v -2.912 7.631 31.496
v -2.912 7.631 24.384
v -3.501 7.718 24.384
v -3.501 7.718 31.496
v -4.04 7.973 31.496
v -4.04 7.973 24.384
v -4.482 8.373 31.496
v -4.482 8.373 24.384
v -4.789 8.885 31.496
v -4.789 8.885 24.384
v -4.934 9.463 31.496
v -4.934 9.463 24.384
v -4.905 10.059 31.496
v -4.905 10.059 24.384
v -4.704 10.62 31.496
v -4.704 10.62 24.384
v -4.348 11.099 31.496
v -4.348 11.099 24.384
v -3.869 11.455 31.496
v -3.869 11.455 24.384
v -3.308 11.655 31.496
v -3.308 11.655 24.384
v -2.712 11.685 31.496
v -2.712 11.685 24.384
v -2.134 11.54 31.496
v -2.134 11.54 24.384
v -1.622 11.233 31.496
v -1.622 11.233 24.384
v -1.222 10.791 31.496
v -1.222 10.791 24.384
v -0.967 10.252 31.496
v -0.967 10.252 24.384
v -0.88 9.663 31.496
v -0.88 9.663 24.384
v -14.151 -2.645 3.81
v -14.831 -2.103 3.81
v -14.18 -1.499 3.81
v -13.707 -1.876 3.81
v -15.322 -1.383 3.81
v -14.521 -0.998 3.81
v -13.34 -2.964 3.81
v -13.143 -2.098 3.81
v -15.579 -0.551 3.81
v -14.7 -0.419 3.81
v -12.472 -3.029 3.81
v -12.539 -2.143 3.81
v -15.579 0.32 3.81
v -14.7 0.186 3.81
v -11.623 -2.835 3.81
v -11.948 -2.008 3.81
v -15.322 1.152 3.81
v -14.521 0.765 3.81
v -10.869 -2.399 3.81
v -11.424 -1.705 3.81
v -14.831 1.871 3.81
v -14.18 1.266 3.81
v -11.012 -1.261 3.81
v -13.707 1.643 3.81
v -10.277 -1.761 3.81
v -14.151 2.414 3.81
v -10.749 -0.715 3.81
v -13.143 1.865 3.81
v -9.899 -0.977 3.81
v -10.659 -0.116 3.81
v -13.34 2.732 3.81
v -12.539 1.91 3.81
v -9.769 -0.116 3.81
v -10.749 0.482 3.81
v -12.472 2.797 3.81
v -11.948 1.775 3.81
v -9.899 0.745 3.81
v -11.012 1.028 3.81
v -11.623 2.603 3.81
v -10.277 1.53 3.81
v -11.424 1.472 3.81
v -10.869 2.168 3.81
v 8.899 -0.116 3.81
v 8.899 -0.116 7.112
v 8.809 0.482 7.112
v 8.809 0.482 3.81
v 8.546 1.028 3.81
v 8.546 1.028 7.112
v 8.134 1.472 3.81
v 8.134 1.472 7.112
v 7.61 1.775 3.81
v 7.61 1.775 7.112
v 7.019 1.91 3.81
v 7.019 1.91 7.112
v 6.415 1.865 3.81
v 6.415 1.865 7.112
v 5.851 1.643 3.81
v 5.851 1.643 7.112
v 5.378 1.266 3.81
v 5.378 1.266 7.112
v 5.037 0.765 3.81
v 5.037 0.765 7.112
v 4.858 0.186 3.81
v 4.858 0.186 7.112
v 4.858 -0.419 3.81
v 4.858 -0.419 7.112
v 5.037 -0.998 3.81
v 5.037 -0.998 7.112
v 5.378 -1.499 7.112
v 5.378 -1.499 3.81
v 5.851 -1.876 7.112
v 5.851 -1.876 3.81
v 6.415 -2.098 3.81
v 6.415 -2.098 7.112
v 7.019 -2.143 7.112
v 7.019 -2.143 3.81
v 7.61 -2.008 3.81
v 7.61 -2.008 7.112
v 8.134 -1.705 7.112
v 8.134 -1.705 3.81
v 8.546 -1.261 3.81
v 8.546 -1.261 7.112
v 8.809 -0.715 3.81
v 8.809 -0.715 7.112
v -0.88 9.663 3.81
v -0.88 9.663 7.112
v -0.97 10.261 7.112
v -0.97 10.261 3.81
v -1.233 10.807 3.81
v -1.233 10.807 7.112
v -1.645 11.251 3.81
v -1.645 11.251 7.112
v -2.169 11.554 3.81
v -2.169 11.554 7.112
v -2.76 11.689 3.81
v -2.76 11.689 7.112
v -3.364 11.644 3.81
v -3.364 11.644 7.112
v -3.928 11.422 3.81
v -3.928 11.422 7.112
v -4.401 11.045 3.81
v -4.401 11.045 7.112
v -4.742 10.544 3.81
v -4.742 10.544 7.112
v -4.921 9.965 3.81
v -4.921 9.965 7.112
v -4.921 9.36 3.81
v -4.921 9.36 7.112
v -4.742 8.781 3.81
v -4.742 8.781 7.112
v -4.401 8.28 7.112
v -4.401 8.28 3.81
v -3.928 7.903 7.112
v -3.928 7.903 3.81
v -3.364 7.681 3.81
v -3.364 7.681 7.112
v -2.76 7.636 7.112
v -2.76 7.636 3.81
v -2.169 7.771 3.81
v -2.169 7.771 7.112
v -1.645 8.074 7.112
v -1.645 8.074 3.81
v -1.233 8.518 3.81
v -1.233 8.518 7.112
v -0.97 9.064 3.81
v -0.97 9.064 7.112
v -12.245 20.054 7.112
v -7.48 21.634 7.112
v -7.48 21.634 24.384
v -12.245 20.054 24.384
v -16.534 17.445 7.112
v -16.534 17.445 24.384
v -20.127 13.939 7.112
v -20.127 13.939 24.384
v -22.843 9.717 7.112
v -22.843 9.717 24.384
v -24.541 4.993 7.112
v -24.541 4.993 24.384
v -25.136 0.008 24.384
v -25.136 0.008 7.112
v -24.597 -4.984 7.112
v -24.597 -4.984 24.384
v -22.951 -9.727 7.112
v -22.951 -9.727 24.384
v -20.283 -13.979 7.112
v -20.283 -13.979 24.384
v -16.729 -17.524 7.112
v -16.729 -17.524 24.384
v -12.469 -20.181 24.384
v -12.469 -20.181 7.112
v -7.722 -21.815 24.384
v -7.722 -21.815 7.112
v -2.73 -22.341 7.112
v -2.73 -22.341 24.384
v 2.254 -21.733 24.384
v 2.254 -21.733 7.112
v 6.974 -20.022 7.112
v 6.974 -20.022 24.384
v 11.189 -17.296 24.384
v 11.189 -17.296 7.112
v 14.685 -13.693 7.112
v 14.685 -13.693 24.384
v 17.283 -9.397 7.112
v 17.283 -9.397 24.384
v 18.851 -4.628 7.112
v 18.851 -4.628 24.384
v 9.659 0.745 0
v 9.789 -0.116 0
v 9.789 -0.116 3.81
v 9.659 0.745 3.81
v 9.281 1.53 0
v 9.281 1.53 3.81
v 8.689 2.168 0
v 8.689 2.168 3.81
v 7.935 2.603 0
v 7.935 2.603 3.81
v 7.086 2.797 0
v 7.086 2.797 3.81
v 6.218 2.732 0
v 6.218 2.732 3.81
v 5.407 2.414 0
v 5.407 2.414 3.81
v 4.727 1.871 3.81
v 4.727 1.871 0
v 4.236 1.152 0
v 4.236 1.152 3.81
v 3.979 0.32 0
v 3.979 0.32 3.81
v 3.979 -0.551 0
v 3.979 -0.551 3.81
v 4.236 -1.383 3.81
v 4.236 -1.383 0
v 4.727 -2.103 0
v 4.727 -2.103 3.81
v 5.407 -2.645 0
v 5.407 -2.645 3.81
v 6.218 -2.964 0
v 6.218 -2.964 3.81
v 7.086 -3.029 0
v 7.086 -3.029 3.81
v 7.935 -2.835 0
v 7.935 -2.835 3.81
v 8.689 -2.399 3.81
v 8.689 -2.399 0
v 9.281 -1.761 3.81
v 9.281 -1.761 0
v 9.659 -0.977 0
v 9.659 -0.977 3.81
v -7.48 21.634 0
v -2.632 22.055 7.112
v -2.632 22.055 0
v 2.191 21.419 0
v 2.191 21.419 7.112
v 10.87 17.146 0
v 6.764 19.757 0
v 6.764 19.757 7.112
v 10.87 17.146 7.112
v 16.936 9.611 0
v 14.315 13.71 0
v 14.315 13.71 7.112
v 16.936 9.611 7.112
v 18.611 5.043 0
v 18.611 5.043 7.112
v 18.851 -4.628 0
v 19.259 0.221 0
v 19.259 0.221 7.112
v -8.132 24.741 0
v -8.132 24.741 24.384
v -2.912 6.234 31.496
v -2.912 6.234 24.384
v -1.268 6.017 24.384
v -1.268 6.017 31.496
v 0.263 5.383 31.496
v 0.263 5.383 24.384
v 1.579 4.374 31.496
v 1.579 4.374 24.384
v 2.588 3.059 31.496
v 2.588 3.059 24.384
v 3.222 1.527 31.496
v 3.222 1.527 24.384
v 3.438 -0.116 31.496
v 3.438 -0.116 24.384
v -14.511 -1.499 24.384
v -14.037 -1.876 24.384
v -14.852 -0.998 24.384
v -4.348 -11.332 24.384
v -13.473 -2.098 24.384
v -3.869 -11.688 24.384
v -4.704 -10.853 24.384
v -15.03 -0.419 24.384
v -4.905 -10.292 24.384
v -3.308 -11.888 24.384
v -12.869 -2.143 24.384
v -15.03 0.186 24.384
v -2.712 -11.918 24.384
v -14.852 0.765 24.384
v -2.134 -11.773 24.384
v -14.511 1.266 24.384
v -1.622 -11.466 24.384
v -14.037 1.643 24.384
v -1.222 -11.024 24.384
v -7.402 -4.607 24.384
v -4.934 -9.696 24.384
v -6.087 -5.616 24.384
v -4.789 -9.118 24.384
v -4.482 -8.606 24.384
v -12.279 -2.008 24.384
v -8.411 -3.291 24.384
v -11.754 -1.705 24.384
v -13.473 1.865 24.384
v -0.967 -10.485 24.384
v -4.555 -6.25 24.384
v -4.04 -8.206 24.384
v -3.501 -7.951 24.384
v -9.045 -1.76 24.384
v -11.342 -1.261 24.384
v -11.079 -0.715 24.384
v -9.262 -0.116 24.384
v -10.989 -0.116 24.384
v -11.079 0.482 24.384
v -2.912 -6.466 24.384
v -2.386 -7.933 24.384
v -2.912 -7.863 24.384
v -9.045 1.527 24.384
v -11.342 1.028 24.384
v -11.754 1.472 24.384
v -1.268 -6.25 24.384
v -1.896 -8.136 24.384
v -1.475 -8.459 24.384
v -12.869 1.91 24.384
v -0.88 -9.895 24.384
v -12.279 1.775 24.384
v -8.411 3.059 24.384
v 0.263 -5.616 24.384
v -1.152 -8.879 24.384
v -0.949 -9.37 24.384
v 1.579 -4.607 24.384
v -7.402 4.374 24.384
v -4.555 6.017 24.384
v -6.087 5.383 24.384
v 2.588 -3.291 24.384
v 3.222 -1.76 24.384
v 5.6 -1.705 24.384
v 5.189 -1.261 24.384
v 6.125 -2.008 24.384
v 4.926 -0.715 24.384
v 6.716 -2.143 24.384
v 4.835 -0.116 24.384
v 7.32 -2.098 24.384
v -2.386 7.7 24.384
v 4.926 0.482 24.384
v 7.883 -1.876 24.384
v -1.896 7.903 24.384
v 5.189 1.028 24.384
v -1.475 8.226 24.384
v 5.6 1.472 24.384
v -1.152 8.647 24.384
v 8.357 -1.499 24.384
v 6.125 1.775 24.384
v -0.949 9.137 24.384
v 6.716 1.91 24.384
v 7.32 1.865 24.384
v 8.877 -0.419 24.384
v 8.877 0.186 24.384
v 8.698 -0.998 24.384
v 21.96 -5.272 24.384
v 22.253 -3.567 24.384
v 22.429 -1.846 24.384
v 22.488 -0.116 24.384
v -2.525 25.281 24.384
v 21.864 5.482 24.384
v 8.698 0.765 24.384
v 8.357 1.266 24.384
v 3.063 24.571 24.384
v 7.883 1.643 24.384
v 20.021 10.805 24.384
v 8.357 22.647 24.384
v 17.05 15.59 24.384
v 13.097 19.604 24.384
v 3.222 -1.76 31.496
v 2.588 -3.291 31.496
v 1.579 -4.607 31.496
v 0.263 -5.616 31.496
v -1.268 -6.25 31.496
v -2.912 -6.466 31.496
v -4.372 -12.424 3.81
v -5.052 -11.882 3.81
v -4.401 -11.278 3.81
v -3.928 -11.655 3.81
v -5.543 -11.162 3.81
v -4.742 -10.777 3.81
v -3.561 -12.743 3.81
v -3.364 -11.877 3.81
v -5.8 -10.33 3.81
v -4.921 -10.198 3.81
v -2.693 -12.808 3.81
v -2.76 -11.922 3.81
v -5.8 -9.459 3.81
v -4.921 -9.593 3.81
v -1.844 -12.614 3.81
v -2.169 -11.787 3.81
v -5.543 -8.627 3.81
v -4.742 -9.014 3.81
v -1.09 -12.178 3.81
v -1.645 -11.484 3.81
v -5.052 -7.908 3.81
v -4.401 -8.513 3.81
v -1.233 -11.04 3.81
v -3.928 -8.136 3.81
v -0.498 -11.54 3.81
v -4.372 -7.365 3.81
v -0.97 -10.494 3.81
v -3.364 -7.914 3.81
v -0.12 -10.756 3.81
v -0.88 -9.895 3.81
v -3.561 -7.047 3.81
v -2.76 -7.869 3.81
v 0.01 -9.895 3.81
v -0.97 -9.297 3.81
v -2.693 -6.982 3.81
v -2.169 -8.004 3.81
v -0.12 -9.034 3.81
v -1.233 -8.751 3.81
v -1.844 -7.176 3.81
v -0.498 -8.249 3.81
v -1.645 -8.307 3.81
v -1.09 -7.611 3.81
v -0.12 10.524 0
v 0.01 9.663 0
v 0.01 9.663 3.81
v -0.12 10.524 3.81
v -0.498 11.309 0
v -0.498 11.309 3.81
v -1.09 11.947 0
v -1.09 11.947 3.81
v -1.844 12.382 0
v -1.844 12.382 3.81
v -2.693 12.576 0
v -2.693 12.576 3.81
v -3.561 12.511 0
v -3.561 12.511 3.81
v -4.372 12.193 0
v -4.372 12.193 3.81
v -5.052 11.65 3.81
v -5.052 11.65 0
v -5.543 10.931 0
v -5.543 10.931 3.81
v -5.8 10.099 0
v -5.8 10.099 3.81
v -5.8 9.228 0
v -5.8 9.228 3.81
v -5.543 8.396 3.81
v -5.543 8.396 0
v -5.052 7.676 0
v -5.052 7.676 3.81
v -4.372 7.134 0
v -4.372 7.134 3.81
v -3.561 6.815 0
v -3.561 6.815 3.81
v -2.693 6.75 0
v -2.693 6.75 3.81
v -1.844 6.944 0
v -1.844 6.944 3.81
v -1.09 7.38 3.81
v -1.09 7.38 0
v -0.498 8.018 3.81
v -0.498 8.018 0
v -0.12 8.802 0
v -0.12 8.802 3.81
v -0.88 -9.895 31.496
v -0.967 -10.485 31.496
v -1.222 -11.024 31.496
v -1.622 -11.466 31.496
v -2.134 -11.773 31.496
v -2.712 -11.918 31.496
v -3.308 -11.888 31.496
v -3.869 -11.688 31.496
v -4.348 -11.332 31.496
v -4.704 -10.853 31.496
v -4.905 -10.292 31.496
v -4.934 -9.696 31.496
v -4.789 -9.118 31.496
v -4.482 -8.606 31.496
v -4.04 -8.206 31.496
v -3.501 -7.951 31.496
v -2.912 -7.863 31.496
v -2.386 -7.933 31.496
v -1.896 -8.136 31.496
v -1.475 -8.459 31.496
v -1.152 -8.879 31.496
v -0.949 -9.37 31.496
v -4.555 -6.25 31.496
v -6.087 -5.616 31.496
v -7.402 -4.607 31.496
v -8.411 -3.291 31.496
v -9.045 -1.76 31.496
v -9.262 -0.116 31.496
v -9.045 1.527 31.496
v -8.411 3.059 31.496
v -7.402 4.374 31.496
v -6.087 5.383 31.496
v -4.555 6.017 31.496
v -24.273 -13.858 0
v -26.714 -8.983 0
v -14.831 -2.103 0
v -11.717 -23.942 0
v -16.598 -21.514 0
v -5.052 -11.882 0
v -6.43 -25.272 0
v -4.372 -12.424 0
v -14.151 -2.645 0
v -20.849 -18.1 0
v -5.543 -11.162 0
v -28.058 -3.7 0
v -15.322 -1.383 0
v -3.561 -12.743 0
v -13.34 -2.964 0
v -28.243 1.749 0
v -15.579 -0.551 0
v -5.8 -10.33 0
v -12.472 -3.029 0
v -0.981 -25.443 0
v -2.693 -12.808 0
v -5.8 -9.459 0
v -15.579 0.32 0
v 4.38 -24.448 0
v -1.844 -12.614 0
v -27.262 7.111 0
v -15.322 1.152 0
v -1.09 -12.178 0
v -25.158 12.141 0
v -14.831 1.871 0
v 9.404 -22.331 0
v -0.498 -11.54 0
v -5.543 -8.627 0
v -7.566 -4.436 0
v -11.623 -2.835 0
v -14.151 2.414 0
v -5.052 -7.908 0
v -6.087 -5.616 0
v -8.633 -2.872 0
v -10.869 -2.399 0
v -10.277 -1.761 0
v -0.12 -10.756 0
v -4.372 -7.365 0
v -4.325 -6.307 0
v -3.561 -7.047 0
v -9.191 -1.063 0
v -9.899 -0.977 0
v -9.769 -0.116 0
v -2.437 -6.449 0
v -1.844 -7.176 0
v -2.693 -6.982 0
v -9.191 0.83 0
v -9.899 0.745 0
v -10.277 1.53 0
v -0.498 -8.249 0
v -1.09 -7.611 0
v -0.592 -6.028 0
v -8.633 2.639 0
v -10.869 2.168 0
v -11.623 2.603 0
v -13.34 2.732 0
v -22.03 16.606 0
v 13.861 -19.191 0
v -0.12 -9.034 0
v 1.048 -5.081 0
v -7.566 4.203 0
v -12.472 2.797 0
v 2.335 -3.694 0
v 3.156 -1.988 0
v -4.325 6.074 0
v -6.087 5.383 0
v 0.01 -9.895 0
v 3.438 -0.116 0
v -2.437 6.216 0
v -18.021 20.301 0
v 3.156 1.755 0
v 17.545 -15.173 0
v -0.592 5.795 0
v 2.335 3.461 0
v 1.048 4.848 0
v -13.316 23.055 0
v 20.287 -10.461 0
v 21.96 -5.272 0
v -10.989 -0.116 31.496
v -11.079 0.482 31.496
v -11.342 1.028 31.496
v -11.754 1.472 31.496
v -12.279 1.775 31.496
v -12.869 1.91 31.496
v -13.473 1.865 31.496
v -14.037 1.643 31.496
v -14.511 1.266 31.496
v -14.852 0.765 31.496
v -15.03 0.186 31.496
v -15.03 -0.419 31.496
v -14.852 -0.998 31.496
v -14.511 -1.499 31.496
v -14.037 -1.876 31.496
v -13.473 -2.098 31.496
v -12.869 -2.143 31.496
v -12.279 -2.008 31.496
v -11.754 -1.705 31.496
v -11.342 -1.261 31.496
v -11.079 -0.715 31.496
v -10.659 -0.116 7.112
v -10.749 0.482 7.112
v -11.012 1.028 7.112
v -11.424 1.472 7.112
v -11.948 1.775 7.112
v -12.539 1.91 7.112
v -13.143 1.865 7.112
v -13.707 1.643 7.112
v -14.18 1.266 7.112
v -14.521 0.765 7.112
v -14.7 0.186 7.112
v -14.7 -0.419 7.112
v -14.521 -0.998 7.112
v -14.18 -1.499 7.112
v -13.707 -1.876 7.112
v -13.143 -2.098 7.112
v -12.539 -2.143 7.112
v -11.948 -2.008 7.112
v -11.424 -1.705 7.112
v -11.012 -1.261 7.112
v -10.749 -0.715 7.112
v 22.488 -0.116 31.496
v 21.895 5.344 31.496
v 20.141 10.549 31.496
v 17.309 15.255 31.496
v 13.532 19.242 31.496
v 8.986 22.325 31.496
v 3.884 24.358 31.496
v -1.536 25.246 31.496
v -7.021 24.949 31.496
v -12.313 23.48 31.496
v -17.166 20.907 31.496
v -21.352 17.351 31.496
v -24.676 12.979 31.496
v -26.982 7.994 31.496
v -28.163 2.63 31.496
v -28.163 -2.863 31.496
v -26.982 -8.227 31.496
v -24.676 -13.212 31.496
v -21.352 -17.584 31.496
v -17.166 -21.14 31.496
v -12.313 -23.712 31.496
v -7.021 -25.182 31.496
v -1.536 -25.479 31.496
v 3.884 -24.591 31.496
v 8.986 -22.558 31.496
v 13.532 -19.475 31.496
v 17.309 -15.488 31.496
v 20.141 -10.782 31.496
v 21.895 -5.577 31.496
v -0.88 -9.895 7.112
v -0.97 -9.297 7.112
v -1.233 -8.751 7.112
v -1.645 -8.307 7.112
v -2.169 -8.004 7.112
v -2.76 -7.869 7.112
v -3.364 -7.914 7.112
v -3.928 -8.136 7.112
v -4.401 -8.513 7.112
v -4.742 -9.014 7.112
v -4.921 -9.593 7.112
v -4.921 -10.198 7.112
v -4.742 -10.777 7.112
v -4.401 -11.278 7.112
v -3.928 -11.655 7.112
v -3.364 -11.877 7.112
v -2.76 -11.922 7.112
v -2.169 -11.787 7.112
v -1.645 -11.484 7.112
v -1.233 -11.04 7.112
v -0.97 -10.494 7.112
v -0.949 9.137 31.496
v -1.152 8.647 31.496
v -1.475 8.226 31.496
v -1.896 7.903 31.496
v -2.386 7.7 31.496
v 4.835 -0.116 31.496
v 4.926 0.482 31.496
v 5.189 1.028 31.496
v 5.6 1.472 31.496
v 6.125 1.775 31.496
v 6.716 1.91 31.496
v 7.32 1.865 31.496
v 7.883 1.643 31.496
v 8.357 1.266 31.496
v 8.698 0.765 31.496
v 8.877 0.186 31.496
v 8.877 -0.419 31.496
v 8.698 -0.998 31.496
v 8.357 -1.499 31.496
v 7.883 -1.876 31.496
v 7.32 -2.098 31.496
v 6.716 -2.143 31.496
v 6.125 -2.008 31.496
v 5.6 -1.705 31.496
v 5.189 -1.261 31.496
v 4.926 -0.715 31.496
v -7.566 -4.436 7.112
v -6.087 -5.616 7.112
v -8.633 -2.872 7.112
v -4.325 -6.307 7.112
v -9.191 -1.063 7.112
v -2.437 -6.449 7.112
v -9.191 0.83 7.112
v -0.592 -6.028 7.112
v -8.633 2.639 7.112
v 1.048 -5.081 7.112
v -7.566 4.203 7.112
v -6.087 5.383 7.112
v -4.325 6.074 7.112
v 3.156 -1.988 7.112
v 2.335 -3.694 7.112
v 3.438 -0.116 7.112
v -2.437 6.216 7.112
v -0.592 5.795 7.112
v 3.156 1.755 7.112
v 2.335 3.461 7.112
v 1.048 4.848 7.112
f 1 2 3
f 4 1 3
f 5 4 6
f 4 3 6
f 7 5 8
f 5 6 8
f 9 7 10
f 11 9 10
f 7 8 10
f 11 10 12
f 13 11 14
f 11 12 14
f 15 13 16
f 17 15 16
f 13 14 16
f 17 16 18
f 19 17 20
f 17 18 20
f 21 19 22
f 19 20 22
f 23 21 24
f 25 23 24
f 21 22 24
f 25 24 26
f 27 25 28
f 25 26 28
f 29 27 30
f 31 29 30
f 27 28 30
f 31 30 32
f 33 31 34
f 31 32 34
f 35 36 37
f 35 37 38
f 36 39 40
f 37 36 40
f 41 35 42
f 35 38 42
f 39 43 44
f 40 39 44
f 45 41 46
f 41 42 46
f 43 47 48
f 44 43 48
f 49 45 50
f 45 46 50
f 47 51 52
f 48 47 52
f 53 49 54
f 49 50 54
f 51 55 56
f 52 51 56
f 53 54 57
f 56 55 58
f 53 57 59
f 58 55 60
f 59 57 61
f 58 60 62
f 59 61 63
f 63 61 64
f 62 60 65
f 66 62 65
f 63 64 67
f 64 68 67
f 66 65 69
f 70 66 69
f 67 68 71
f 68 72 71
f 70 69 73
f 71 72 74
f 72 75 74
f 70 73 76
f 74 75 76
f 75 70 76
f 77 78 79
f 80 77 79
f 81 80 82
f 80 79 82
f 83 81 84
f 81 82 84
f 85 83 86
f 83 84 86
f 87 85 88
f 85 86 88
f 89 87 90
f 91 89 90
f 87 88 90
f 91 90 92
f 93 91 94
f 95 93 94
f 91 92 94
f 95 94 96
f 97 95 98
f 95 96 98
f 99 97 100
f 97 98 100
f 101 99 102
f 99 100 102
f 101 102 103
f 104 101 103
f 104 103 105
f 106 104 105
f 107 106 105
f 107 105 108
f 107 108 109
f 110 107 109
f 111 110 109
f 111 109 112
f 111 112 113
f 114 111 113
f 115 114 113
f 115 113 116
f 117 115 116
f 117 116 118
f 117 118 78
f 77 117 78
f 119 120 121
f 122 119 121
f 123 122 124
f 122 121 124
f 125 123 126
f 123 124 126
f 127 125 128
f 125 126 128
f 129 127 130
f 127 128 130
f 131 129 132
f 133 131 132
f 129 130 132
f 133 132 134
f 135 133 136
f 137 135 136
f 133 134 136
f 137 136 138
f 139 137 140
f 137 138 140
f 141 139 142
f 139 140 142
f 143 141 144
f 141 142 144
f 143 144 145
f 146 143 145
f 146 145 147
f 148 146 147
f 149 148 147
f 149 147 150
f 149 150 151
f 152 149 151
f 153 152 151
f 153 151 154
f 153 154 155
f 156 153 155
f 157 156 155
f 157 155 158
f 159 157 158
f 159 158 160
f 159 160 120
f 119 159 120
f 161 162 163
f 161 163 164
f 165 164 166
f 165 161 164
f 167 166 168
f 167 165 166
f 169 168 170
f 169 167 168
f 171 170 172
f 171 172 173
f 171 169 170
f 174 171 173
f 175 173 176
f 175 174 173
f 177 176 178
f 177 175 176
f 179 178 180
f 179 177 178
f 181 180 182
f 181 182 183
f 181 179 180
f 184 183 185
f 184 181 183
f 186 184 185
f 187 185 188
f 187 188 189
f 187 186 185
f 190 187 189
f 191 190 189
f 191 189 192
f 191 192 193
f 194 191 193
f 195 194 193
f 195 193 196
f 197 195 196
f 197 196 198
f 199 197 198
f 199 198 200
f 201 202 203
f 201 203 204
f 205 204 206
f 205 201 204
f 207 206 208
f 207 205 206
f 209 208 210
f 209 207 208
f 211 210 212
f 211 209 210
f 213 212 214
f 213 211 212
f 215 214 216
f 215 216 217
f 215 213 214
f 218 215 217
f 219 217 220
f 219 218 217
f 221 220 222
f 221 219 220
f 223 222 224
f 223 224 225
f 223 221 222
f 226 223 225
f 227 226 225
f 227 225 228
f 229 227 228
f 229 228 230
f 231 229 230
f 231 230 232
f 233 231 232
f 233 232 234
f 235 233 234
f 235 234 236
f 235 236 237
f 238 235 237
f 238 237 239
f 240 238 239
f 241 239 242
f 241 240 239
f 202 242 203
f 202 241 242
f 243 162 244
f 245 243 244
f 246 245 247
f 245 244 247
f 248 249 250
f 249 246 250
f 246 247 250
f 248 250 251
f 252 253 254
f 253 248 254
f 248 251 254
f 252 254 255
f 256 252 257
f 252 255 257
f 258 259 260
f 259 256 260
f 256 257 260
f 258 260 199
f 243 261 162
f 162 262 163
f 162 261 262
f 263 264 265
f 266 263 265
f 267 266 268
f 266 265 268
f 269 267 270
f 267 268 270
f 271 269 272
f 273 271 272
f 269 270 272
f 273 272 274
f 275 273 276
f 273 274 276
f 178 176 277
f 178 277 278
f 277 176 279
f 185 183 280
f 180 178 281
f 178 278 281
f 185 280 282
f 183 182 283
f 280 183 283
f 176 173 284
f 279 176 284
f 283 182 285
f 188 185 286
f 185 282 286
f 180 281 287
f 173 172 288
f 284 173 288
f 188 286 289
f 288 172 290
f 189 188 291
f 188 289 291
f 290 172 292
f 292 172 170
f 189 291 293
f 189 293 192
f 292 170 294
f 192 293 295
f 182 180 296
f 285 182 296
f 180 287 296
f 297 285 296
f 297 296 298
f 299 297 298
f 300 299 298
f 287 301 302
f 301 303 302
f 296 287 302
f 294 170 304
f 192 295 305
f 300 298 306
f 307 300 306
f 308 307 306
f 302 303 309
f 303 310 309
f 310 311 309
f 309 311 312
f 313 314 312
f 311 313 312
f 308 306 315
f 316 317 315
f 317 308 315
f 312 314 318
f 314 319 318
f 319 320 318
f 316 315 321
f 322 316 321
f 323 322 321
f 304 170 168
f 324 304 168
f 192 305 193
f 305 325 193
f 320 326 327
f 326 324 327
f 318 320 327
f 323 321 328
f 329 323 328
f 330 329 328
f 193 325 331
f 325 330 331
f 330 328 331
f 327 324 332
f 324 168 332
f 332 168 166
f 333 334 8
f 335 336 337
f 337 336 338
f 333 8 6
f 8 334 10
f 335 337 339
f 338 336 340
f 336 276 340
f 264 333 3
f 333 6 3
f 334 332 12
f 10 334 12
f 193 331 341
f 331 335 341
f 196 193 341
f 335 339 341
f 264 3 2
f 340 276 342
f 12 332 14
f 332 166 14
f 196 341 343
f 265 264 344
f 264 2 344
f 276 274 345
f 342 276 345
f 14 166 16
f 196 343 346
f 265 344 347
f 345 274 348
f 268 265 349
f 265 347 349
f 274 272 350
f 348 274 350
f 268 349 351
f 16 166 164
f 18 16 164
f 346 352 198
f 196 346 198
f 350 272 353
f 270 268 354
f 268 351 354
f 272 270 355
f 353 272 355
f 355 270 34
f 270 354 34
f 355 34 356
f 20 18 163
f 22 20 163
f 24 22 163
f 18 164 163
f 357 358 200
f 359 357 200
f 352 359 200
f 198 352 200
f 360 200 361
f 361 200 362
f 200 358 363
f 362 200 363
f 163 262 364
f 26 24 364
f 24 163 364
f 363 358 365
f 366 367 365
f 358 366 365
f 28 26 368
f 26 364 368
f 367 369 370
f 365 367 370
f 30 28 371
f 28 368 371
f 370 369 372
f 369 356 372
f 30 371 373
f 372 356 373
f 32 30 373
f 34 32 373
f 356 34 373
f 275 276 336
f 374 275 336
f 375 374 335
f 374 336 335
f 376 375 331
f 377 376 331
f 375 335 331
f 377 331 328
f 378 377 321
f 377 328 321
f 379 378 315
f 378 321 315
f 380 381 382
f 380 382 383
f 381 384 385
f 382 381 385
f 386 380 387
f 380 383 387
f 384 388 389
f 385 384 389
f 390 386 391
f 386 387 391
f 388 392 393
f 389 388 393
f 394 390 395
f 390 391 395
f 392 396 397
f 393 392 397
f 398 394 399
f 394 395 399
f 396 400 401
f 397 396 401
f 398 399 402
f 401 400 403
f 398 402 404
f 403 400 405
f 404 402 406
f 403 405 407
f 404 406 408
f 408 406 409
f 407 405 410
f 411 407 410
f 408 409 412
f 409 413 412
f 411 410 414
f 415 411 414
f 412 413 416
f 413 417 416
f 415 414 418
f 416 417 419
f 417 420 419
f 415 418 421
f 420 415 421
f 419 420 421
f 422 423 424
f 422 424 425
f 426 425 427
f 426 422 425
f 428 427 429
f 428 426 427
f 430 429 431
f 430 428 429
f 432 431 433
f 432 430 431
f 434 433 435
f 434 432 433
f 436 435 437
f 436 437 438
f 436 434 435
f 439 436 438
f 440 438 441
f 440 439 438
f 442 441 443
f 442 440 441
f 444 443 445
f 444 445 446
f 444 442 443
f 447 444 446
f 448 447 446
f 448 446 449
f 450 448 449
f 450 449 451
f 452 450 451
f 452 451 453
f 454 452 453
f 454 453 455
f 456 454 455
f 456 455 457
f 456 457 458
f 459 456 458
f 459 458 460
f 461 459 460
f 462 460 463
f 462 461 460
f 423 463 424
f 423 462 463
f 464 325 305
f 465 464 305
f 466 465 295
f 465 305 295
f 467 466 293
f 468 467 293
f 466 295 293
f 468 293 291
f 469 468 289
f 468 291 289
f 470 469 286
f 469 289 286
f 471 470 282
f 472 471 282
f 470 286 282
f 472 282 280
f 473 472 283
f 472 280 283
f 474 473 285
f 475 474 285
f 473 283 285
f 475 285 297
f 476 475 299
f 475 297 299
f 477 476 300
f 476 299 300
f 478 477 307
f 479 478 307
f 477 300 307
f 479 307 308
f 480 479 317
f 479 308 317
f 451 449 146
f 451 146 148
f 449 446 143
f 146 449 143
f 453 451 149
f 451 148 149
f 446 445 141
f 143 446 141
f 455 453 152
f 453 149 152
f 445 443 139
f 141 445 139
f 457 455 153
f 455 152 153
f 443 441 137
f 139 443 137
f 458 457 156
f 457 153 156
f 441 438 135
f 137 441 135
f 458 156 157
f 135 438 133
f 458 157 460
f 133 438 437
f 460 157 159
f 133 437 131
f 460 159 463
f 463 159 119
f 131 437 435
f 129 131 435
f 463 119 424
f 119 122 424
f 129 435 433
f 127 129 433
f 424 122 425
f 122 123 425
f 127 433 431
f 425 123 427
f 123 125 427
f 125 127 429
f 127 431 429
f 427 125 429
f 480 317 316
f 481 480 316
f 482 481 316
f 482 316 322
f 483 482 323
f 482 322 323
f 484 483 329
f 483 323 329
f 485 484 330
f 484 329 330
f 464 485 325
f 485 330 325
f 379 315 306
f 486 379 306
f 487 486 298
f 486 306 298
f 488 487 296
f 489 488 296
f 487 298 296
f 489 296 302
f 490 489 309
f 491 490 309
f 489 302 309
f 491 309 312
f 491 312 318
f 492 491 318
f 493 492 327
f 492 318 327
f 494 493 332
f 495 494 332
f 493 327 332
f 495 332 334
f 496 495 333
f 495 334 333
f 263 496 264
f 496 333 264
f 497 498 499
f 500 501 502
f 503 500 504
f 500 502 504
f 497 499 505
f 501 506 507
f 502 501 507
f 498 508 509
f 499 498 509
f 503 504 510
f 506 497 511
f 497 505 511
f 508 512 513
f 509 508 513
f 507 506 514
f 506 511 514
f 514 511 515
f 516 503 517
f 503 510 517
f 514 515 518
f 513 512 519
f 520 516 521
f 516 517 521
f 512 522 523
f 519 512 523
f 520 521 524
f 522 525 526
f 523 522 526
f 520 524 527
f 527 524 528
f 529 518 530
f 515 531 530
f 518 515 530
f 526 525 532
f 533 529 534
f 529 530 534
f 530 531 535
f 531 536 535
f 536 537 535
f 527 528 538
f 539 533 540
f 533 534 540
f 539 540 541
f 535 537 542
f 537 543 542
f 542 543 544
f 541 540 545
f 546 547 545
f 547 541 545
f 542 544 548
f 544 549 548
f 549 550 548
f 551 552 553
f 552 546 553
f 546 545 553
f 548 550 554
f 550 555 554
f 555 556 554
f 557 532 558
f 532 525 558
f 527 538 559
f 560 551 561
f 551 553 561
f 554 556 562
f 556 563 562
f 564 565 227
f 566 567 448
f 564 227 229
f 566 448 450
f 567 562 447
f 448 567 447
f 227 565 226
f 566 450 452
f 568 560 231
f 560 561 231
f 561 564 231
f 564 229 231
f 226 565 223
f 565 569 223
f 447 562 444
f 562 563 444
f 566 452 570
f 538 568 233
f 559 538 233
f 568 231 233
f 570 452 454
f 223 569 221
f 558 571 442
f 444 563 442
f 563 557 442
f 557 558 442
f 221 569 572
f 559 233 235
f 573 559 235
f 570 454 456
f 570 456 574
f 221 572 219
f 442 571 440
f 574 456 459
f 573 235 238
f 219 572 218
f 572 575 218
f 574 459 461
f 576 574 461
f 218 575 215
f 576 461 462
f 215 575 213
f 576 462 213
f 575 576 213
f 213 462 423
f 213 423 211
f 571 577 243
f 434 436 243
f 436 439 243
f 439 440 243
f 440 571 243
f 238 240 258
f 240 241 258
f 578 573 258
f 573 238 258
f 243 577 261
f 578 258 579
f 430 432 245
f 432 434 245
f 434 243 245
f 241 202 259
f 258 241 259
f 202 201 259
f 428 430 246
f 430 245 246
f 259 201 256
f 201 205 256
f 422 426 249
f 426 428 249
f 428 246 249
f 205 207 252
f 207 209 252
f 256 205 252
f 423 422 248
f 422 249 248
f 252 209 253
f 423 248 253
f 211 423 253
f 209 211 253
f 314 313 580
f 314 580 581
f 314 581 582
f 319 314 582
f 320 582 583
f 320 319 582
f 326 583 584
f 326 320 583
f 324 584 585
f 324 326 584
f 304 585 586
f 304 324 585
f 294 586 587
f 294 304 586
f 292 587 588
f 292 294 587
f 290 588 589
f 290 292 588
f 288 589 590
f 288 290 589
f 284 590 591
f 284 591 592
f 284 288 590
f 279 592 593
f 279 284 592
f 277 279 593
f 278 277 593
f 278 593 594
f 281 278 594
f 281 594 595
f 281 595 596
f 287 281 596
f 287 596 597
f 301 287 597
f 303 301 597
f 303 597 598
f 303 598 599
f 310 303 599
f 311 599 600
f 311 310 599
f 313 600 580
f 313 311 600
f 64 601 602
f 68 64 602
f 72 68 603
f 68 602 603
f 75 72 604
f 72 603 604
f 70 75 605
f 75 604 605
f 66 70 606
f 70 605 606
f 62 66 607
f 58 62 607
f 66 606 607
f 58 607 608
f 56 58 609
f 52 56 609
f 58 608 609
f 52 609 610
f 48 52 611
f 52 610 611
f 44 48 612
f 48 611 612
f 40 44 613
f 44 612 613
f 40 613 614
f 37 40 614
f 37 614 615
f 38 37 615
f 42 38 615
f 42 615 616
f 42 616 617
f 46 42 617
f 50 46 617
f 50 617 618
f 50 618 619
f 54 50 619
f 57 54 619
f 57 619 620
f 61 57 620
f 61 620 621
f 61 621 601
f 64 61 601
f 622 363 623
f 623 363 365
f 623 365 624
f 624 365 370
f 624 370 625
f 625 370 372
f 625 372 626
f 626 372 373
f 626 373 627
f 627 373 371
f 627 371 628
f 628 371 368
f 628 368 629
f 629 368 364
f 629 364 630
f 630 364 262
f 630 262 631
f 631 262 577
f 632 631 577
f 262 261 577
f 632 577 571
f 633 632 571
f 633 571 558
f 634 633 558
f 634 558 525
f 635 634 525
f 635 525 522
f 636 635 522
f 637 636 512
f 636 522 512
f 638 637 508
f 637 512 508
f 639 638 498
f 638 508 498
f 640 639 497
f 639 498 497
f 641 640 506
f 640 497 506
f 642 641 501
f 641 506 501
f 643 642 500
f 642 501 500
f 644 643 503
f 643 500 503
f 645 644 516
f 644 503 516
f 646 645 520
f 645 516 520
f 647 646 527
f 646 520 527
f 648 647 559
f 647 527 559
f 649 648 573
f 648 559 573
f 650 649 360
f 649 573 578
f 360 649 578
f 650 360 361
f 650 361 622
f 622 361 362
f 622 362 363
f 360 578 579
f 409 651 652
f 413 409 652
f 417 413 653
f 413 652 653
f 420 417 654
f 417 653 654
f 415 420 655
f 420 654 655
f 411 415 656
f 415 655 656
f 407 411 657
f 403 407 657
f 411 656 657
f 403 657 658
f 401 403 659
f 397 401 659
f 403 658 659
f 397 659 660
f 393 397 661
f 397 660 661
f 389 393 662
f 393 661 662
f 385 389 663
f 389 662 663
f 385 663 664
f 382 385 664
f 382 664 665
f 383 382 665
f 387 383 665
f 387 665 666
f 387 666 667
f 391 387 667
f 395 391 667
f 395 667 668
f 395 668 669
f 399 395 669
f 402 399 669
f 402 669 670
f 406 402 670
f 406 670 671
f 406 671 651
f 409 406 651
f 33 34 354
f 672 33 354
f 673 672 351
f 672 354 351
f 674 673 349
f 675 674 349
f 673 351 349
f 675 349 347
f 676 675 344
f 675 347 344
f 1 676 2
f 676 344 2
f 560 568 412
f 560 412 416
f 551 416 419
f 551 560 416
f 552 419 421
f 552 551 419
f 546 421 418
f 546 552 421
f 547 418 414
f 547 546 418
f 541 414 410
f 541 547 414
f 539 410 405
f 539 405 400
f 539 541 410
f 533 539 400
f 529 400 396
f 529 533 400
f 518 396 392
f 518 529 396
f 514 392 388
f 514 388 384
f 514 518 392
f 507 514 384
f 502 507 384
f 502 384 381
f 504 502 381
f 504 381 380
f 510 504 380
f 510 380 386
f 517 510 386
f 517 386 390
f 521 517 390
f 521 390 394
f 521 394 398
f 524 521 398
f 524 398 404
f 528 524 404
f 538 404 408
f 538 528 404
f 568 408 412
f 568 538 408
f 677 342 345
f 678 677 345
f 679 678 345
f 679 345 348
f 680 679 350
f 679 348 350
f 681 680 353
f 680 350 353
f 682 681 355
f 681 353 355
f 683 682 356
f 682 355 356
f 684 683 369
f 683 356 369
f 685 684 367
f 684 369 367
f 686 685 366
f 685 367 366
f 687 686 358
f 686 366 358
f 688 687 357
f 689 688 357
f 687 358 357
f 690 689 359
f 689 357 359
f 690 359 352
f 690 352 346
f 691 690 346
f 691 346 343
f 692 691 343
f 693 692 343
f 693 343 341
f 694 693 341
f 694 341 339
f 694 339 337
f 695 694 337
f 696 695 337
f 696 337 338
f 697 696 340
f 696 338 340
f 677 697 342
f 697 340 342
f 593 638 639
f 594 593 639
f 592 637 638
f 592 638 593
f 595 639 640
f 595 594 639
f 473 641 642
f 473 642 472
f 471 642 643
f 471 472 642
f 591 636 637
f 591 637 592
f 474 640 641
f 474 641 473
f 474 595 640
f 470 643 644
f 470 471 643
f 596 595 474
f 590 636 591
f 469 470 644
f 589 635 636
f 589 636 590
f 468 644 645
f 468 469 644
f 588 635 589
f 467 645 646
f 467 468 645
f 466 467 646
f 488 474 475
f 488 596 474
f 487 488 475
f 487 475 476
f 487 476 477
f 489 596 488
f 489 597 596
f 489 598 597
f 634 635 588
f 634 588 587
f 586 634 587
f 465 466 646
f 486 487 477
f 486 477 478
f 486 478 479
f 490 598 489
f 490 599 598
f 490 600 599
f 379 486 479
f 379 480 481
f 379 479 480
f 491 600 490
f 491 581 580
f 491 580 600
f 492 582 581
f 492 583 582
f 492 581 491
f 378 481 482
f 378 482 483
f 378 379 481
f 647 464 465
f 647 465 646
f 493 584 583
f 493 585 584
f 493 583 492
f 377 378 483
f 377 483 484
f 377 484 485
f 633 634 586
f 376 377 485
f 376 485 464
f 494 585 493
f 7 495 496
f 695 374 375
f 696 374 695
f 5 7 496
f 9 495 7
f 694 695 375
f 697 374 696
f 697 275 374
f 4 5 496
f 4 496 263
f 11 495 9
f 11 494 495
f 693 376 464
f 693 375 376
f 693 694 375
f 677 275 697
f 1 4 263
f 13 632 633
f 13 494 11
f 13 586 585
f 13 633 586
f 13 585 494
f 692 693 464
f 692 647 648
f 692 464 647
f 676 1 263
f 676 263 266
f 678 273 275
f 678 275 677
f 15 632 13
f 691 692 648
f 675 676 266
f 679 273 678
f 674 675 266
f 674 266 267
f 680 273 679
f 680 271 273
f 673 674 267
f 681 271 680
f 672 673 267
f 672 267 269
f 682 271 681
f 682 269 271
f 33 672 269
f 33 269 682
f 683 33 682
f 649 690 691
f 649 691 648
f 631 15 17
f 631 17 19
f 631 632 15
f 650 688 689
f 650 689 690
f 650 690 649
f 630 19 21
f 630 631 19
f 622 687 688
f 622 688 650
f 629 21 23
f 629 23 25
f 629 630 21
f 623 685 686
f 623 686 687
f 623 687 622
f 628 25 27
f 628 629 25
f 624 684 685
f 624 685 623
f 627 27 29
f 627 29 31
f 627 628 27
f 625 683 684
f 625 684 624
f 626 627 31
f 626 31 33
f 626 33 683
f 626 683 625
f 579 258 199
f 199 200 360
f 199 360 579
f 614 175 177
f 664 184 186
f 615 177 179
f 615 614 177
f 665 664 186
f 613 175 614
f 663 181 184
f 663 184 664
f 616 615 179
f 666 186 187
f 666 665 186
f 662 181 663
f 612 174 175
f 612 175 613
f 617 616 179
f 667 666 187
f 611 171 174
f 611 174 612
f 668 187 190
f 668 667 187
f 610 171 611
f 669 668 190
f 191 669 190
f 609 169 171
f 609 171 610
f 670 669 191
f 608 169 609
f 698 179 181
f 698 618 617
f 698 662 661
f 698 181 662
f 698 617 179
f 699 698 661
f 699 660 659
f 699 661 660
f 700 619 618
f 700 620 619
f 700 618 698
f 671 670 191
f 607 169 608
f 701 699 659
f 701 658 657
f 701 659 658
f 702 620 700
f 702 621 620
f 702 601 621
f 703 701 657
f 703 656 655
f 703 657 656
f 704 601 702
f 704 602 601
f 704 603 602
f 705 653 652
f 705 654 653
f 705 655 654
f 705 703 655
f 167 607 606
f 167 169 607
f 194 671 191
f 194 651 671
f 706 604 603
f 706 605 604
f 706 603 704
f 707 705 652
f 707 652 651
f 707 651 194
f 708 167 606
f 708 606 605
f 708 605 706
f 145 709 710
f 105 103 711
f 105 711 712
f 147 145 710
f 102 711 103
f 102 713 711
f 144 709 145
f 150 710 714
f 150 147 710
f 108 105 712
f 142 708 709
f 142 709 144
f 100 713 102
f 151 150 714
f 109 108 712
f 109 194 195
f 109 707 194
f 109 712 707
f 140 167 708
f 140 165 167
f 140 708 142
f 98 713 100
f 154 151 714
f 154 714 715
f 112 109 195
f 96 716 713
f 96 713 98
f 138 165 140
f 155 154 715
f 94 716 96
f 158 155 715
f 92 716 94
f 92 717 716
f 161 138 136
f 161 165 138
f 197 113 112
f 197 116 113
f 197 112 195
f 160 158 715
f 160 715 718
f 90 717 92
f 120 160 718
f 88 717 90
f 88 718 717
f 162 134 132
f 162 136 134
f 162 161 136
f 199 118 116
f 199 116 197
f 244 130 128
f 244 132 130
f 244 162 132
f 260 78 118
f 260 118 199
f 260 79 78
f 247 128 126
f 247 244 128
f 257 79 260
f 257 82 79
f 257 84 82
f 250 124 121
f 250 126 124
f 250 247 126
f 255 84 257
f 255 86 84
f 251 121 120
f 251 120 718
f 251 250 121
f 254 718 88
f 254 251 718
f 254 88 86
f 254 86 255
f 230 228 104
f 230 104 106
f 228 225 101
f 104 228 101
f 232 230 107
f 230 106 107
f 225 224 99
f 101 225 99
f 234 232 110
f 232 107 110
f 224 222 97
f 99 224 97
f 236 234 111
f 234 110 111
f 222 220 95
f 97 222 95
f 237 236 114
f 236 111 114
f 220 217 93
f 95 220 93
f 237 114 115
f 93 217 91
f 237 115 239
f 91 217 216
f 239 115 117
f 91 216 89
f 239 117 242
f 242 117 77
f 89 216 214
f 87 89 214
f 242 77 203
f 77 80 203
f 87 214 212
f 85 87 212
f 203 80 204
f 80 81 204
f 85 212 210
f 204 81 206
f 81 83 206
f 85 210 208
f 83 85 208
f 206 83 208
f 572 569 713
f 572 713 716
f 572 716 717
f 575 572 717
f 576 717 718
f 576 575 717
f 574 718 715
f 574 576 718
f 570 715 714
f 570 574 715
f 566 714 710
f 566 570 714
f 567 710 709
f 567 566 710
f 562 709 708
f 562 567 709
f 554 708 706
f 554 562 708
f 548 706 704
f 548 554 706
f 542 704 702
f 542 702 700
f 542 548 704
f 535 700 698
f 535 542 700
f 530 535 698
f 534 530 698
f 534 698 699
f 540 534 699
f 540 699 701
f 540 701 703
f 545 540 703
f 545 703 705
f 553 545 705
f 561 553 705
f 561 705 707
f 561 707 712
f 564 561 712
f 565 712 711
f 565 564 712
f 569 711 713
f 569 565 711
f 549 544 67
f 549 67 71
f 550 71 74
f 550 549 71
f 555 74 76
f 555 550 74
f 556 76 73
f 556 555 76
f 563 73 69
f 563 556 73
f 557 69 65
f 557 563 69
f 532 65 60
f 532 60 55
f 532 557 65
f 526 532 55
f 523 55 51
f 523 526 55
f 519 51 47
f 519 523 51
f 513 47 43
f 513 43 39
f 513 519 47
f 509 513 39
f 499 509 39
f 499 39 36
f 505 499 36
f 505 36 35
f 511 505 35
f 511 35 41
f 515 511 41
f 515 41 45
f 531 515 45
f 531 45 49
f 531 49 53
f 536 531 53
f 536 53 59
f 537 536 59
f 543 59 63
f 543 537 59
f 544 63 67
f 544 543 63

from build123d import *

# Parameters (mm, degrees)
F0_R      = 25.4
F0_R_2    = 22.225
F0_R_3    = 6.35
F1_DEPTH  = 7.112
F2_R      = 25.4
F2_R_2    = 22.225
F3_DEPTH  = 17.272
F4_R      = 2.032
F5_DEPTH  = 21.29049
F6_R      = 2.921
F7_DEPTH  = 3.81
F9_DEPTH  = 17.272
F10_R     = 25.4
F10_R_2   = 2.032
F11_DEPTH = 7.112
F12_DEPTH = 25.4


with BuildPart() as f1:
    # F0 (on Top) → F1 (new body)
    with BuildSketch(Plane.XY):
        with Locations((-2.9115700163, -0.1164628848)):
            Circle(F0_R)
        with Locations((-2.9115700163, -0.1164628848)):
            Circle(F0_R_2, mode=Mode.SUBTRACT)
        with Locations((-2.9115700163, -0.1164628848)):
            Circle(F0_R_2)
        with Locations((-2.9115700163, -0.1164628848)):
            Circle(F0_R_3, mode=Mode.SUBTRACT)
    extrude(amount=F1_DEPTH)

    # F2 (on face) → F3 (join)
    with BuildSketch(Plane.XY.offset(7.112)):
        with Locations((-2.9115700163, -0.1164628848)):
            Circle(F2_R)
        with Locations((-2.9115700163, -0.1164628848)):
            Circle(F2_R_2, mode=Mode.SUBTRACT)
    extrude(amount=F3_DEPTH)

    # F4 (on face) → F5 (cut)
    with BuildSketch(Plane.XY.offset(7.112)):
        with Locations((-2.9115700163, 9.6625371152)):
            Circle(F4_R)
        with Locations((-12.6905700163, -0.1164628848)):
            Circle(F4_R)
        with Locations((6.8674299837, -0.1164628848)):
            Circle(F4_R)
        with Locations((-2.9115700163, -9.8954628848)):
            Circle(F4_R)
    extrude(amount=-F5_DEPTH, mode=Mode.SUBTRACT)

    # F6 (on face) → F7 (cut)
    with BuildSketch(Plane.XY):
        with Locations((-2.9112251941, -9.8947474398)):
            Circle(F6_R)
        with Locations((6.8677748059, -0.1157474398)):
            Circle(F6_R)
        with Locations((-2.9112251941, 9.6632525602)):
            Circle(F6_R)
        with Locations((-12.6902251941, -0.1157474398)):
            Circle(F6_R)
    extrude(amount=F7_DEPTH, mode=Mode.SUBTRACT)

    # F8 (on face) → F9 (cut)
    with BuildSketch(Plane.XY.offset(24.384)):
        with BuildLine():
            ThreePointArc((-7.4796047728, 21.634024086), (12.685813093, 15.5216009657), (18.8507418749, -4.6278269968))
            Line((18.8507418749, -4.6278269968), (21.9596435736, -5.2723075843))
            ThreePointArc((21.9596435736, -5.2723075843), (15.0679881207, 17.9099891283), (-8.1321811666, 24.7412365103))
            Line((-8.1321811666, 24.7412365103), (-7.4796047728, 21.634024086))
        make_face()
    extrude(amount=-F9_DEPTH, mode=Mode.SUBTRACT)

    # F10 (on face) → F11 (join)
    with BuildSketch(Plane.XY.offset(24.384)):
        with Locations((-2.9115700163, -0.1164628848)):
            Circle(F10_R)
        with BuildLine():
            ThreePointArc((-0.8795700163, -9.8954628848), (-4.3484109957, -11.3323038641), (-2.9115700163, -7.8634628848))
            ThreePointArc((-2.9115700163, -7.8634628848), (-1.4747290369, -8.4586219054), (-0.8795700163, -9.8954628848))
        make_face(mode=Mode.SUBTRACT)
        with Locations((-13.0211196663, -0.1164628848)):
            Circle(F10_R_2, mode=Mode.SUBTRACT)
        with BuildLine():
            ThreePointArc((-2.9115700163, 6.2335371152), (1.5785580442, 4.3736651758), (3.4384299837, -0.1164628848))
            ThreePointArc((3.4384299837, -0.1164628848), (1.5785580442, -4.6065909453), (-2.9115700163, -6.4664628848))
            ThreePointArc((-2.9115700163, -6.4664628848), (-7.4016980768, -4.6065909453), (-9.2615700163, -0.1164628848))
            ThreePointArc((-9.2615700163, -0.1164628848), (-7.4016980768, 4.3736651758), (-2.9115700163, 6.2335371152))
        make_face(mode=Mode.SUBTRACT)
        with BuildLine():
            ThreePointArc((8.8994299837, -0.1164628848), (6.8674299837, -2.1484628848), (4.8354299837, -0.1164628848))
            ThreePointArc((4.8354299837, -0.1164628848), (6.8674299837, 1.9155371152), (8.8994299837, -0.1164628848))
        make_face(mode=Mode.SUBTRACT)
        with BuildLine():
            ThreePointArc((-0.8795700163, 9.6625371152), (-1.4747290369, 8.2256961359), (-2.9115700163, 7.6305371152))
            ThreePointArc((-2.9115700163, 7.6305371152), (-4.3484109957, 11.0993780946), (-0.8795700163, 9.6625371152))
        make_face(mode=Mode.SUBTRACT)
    extrude(amount=F11_DEPTH)

    # F8 (on face) → F12 (cut)
    with BuildSketch(Plane.XY.offset(24.384)):
        with BuildLine():
            ThreePointArc((-7.4796047728, 21.634024086), (12.685813093, 15.5216009657), (18.8507418749, -4.6278269968))
            Line((18.8507418749, -4.6278269968), (21.9596435736, -5.2723075843))
            ThreePointArc((21.9596435736, -5.2723075843), (15.0679881207, 17.9099891283), (-8.1321811666, 24.7412365103))
            Line((-8.1321811666, 24.7412365103), (-7.4796047728, 21.634024086))
        make_face()
    extrude(amount=-F12_DEPTH, mode=Mode.SUBTRACT)


solid = f1.part
